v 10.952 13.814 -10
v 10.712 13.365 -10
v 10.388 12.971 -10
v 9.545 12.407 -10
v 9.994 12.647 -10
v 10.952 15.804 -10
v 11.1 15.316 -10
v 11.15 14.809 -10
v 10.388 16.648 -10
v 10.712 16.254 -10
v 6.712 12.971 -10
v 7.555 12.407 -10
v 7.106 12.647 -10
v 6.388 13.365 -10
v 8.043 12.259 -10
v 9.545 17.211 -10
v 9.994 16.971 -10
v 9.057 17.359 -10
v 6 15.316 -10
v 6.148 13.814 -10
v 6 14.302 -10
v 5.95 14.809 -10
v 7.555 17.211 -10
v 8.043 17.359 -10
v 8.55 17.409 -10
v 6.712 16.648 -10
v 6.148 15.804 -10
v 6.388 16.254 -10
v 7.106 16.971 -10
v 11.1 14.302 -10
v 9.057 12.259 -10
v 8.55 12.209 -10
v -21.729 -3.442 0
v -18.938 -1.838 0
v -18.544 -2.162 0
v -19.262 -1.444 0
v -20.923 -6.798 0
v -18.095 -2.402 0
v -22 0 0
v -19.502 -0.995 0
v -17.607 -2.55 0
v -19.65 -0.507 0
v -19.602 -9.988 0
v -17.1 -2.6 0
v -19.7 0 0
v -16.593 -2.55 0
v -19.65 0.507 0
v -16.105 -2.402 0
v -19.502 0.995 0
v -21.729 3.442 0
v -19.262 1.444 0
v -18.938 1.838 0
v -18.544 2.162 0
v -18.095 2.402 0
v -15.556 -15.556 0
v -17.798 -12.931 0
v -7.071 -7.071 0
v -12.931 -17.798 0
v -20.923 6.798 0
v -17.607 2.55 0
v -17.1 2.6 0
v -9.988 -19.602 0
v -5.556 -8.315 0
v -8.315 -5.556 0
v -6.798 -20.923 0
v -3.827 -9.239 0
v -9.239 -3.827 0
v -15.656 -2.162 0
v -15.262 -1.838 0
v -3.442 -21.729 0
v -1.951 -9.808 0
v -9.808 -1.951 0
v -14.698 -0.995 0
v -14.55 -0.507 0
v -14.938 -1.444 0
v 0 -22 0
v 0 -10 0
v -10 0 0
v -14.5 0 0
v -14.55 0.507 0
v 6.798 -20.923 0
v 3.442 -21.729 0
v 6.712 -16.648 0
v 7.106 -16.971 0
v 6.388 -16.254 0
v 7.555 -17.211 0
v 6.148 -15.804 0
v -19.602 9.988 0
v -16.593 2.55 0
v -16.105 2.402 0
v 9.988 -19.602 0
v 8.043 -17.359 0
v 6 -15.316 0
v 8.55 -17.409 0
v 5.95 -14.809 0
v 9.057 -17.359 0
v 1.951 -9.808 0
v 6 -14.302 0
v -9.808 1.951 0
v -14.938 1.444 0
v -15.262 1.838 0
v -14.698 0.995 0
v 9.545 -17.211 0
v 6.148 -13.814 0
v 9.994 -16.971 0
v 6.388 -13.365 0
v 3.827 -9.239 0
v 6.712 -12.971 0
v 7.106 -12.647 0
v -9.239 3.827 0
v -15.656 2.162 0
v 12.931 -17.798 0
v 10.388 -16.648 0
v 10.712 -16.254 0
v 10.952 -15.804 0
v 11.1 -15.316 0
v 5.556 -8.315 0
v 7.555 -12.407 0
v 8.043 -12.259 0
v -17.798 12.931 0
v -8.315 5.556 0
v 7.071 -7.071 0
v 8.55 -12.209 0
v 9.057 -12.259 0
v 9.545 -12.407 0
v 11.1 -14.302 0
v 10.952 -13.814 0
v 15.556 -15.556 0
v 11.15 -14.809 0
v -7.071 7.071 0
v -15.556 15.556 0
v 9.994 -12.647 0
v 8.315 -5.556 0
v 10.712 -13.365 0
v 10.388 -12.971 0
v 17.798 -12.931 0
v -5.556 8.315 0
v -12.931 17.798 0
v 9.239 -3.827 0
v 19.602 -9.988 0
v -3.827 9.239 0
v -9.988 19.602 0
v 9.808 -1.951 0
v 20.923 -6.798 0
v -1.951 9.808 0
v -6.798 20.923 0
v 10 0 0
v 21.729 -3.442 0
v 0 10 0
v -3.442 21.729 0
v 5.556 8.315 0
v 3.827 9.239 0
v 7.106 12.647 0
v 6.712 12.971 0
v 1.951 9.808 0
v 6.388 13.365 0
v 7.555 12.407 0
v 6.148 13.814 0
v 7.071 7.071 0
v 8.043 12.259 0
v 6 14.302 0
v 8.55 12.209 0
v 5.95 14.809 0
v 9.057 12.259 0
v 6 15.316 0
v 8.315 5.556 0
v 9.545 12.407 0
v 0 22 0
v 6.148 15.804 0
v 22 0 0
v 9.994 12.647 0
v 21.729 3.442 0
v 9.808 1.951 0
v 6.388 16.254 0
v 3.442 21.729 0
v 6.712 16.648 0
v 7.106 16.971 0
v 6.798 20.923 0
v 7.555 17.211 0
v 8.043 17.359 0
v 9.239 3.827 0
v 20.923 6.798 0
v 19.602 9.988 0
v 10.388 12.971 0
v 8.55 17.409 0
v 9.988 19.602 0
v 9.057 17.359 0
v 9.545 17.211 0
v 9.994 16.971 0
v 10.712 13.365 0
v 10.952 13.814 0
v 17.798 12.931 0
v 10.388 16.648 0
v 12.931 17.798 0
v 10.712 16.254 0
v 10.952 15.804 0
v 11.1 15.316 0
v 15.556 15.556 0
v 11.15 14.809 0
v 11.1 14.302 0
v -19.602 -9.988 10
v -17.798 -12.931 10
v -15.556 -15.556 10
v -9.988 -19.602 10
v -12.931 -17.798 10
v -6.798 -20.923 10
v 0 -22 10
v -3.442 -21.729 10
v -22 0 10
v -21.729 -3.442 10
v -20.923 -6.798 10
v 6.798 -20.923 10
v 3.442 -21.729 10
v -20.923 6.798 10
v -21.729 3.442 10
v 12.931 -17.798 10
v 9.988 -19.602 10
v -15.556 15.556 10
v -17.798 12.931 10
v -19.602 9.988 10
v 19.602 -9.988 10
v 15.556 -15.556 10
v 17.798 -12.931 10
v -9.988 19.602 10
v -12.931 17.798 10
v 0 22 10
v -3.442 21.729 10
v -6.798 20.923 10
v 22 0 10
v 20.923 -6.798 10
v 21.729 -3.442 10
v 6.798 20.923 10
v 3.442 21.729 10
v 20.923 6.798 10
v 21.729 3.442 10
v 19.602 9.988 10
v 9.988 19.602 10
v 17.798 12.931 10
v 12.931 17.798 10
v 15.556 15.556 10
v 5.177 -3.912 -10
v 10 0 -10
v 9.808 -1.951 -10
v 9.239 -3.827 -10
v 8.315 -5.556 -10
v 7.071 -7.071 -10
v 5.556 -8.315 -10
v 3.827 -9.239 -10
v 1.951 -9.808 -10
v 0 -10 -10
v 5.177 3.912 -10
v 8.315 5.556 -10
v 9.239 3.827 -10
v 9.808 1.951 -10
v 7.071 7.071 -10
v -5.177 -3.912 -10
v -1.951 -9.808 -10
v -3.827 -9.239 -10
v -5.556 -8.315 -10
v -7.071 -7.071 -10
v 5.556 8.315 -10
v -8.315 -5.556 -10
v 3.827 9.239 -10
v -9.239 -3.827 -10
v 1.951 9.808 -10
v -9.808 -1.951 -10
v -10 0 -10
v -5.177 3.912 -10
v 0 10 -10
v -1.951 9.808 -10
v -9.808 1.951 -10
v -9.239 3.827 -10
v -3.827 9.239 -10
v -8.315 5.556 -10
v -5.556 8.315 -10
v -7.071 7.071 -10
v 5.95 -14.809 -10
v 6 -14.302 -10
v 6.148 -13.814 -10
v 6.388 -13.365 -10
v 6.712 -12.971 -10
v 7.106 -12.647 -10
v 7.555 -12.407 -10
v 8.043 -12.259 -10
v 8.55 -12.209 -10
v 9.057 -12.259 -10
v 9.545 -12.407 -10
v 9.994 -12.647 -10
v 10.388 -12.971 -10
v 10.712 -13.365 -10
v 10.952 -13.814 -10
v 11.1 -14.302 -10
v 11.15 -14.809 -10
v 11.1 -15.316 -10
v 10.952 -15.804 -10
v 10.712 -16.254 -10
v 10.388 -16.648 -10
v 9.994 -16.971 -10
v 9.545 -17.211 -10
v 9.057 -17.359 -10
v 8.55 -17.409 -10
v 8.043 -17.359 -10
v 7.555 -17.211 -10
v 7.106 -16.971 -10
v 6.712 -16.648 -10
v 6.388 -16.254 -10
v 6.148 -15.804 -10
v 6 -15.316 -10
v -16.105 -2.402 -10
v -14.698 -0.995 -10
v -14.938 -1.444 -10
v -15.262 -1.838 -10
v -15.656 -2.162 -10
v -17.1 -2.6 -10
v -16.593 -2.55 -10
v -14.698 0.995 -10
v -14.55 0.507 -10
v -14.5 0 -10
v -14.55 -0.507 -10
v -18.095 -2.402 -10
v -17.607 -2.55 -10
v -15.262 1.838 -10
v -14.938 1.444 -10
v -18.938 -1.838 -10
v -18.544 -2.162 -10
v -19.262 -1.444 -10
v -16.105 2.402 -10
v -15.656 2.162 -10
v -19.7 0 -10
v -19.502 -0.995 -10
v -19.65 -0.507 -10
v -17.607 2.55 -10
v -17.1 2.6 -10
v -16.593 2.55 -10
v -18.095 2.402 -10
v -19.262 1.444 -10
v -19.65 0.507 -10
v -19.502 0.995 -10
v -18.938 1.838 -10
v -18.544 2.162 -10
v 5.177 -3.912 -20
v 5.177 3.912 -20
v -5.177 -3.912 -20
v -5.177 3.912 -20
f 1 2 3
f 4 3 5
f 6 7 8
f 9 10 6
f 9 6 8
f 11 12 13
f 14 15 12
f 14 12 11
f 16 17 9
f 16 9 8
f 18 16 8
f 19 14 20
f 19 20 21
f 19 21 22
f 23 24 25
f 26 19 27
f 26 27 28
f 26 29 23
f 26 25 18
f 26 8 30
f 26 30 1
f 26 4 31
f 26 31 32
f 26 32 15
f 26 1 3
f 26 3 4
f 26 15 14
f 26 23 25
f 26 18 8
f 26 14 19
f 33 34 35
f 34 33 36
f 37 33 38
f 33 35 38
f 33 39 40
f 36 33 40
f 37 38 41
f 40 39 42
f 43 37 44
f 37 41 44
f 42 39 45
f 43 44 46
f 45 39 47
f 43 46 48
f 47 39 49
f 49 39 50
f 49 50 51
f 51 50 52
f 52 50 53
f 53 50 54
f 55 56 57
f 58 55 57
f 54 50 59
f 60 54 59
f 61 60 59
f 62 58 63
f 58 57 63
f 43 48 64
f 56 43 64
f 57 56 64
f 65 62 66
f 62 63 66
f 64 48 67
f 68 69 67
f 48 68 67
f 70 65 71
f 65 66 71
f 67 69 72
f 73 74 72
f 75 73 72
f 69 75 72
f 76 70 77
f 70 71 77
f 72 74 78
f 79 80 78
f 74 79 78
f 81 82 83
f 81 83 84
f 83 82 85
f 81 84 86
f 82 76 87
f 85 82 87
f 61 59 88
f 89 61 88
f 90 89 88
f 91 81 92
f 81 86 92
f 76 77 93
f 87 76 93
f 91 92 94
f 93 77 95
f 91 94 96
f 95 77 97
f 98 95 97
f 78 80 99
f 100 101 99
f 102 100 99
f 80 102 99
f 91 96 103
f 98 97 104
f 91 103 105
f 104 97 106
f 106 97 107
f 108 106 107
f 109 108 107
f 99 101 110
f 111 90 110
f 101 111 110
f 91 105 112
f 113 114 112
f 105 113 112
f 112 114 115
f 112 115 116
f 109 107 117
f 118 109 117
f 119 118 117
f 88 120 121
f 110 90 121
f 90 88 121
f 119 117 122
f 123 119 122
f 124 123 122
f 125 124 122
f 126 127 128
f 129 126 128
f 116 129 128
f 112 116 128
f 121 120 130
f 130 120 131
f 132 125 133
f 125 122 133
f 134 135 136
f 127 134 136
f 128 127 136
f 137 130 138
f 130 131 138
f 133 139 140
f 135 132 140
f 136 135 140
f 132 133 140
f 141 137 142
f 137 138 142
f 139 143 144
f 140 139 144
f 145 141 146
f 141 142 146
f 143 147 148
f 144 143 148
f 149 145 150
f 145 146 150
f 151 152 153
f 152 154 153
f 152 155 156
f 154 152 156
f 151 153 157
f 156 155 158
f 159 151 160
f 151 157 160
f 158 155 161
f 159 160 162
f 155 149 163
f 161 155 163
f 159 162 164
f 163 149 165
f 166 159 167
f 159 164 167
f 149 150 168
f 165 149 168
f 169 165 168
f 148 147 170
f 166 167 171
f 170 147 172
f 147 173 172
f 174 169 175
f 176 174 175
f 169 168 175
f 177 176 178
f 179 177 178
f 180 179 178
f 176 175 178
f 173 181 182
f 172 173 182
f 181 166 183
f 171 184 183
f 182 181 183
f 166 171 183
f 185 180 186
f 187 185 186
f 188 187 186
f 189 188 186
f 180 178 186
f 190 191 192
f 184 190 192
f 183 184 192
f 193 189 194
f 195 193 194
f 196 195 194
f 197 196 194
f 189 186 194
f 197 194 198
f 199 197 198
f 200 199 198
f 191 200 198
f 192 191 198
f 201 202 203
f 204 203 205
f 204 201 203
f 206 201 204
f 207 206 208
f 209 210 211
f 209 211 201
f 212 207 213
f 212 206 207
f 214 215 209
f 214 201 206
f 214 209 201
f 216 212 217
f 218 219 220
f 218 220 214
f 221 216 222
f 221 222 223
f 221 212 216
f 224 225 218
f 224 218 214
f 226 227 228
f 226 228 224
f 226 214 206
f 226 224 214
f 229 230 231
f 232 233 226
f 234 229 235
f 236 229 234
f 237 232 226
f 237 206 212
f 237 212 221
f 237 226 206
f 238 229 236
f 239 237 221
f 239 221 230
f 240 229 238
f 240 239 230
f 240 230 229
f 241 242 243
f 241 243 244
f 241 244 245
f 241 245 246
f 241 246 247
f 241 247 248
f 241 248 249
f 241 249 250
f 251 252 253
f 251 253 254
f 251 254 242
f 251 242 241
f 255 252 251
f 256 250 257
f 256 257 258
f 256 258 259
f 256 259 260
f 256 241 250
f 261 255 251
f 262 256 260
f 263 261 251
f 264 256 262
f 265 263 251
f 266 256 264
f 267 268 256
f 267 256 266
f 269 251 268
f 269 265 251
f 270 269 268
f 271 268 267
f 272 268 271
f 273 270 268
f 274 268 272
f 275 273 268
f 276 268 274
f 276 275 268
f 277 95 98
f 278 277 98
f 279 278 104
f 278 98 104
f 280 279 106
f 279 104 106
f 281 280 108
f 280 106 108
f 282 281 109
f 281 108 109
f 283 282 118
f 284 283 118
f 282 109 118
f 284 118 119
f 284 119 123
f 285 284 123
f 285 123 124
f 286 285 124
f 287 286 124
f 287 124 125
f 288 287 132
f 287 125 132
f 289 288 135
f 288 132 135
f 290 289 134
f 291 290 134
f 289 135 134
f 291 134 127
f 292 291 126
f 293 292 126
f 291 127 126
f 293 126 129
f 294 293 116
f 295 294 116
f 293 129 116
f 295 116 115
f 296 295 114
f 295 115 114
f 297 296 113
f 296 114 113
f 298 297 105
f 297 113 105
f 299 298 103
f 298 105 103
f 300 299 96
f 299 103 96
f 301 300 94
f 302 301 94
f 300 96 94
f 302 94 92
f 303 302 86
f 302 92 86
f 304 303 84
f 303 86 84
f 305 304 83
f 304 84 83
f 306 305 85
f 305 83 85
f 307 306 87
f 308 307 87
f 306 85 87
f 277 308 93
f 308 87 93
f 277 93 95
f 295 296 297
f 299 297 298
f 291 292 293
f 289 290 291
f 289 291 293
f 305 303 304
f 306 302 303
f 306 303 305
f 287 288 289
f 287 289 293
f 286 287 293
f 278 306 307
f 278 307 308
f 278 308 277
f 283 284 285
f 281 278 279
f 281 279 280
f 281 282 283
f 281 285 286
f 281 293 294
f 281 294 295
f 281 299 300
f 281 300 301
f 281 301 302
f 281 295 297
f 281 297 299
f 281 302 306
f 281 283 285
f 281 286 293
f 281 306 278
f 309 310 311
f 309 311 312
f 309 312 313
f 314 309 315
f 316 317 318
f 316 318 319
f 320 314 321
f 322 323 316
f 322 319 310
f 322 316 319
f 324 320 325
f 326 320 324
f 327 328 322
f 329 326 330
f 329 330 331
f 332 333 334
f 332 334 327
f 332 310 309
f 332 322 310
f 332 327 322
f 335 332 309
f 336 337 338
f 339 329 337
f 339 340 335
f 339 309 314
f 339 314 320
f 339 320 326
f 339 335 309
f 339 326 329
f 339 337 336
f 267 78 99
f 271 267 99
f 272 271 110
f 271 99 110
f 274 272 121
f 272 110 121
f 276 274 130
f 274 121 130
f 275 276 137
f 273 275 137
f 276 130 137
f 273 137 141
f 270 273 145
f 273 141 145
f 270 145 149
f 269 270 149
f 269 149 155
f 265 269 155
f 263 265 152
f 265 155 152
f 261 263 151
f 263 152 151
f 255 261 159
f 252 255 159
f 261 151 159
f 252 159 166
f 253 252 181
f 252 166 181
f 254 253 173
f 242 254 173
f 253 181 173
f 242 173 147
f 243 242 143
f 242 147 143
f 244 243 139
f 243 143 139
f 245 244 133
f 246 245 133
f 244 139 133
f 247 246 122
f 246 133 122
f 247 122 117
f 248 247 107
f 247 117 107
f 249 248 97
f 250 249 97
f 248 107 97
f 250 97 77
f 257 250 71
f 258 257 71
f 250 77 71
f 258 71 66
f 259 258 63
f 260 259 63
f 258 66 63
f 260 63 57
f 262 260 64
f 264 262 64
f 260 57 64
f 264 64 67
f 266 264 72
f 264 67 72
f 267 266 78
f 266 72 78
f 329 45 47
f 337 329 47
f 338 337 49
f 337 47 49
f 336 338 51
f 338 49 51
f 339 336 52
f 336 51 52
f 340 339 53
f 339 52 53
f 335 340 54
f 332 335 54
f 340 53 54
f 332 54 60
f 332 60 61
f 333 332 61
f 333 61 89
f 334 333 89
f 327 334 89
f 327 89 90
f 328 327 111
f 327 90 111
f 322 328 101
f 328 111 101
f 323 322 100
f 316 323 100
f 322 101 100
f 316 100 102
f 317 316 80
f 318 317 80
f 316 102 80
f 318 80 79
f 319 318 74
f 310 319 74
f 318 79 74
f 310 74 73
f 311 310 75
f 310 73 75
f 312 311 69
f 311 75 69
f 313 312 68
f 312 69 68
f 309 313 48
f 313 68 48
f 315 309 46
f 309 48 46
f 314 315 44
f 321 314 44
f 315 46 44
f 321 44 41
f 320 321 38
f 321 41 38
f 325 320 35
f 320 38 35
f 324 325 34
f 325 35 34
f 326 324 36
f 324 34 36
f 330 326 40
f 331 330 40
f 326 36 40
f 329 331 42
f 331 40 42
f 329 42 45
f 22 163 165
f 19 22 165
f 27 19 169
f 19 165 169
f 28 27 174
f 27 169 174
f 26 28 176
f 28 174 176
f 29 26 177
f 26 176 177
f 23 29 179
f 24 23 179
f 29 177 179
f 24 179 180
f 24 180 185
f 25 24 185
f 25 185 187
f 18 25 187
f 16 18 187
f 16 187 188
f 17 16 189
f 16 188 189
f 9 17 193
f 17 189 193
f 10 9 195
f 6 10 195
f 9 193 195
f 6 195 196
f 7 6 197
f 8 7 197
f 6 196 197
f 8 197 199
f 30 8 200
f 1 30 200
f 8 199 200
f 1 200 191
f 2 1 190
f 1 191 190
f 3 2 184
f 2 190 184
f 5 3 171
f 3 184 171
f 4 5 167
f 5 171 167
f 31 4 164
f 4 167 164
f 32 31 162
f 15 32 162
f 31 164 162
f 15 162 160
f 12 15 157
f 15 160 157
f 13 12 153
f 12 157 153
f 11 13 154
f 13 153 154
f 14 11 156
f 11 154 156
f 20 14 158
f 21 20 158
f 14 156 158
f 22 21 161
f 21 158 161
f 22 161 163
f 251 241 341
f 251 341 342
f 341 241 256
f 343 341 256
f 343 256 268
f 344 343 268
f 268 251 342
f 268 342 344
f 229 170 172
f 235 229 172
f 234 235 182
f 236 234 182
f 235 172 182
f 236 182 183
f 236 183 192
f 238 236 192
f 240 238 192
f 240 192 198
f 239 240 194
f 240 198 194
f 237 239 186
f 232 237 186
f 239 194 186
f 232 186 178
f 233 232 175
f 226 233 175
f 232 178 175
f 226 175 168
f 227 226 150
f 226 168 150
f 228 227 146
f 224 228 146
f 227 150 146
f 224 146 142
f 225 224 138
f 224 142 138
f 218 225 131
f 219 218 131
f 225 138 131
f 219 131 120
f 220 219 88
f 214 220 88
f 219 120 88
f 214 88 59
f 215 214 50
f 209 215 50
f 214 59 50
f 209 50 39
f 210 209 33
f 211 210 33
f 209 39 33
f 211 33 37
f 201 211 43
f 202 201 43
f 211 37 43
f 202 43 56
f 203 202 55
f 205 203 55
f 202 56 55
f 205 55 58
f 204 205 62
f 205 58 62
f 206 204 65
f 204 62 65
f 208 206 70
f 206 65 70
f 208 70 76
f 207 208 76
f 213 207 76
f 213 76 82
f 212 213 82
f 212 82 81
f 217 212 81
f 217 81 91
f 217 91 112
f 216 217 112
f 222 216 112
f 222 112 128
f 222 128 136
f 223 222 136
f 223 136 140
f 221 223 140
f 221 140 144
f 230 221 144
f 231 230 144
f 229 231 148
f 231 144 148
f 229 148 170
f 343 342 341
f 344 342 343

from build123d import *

# Parameters (mm, degrees)
SKETCH1_R           = 22
BOSS_EXTRUDE1_DEPTH = 10
SKETCH3_R           = 10
BOSS_EXTRUDE2_DEPTH = 10
SKETCH4_R           = 2.6
BOSS_EXTRUDE3_DEPTH = 10
SKETCH7_W           = 10.354007758
SKETCH7_H           = 7.823019208
BOSS_EXTRUDE4_DEPTH = 10


with BuildPart() as part:
    # Sketch1 → Boss-Extrude1 (new body)
    with BuildSketch(Plane.XY):
        Circle(SKETCH1_R)
    extrude(amount=BOSS_EXTRUDE1_DEPTH)

    # Sketch3 → Boss-Extrude2 (add)
    with BuildSketch(Plane(origin=(0, 0, 0), x_dir=(-1, 0, 0), z_dir=(0, 0, -1))):
        Circle(SKETCH3_R)
    extrude(amount=BOSS_EXTRUDE2_DEPTH)

    # Sketch4 → Boss-Extrude3 (add)
    with BuildSketch(Plane(origin=(0, 0, 0), x_dir=(-1, 0, 0), z_dir=(0, 0, -1))):
        with Locations((17.1, 0)):
            Circle(SKETCH4_R)
        with Locations((-8.55, -14.809034405)):
            Circle(SKETCH4_R)
        with Locations((-8.55, 14.809034405)):
            Circle(SKETCH4_R)
    extrude(amount=BOSS_EXTRUDE3_DEPTH)

    # Sketch7 → Boss-Extrude4 (add)
    with BuildSketch(Plane(origin=(0, 0, -10), x_dir=(-1, 0, 0), z_dir=(0, 0, -1))):
        Rectangle(SKETCH7_W, SKETCH7_H)
    extrude(amount=BOSS_EXTRUDE4_DEPTH)


solid = part.part
